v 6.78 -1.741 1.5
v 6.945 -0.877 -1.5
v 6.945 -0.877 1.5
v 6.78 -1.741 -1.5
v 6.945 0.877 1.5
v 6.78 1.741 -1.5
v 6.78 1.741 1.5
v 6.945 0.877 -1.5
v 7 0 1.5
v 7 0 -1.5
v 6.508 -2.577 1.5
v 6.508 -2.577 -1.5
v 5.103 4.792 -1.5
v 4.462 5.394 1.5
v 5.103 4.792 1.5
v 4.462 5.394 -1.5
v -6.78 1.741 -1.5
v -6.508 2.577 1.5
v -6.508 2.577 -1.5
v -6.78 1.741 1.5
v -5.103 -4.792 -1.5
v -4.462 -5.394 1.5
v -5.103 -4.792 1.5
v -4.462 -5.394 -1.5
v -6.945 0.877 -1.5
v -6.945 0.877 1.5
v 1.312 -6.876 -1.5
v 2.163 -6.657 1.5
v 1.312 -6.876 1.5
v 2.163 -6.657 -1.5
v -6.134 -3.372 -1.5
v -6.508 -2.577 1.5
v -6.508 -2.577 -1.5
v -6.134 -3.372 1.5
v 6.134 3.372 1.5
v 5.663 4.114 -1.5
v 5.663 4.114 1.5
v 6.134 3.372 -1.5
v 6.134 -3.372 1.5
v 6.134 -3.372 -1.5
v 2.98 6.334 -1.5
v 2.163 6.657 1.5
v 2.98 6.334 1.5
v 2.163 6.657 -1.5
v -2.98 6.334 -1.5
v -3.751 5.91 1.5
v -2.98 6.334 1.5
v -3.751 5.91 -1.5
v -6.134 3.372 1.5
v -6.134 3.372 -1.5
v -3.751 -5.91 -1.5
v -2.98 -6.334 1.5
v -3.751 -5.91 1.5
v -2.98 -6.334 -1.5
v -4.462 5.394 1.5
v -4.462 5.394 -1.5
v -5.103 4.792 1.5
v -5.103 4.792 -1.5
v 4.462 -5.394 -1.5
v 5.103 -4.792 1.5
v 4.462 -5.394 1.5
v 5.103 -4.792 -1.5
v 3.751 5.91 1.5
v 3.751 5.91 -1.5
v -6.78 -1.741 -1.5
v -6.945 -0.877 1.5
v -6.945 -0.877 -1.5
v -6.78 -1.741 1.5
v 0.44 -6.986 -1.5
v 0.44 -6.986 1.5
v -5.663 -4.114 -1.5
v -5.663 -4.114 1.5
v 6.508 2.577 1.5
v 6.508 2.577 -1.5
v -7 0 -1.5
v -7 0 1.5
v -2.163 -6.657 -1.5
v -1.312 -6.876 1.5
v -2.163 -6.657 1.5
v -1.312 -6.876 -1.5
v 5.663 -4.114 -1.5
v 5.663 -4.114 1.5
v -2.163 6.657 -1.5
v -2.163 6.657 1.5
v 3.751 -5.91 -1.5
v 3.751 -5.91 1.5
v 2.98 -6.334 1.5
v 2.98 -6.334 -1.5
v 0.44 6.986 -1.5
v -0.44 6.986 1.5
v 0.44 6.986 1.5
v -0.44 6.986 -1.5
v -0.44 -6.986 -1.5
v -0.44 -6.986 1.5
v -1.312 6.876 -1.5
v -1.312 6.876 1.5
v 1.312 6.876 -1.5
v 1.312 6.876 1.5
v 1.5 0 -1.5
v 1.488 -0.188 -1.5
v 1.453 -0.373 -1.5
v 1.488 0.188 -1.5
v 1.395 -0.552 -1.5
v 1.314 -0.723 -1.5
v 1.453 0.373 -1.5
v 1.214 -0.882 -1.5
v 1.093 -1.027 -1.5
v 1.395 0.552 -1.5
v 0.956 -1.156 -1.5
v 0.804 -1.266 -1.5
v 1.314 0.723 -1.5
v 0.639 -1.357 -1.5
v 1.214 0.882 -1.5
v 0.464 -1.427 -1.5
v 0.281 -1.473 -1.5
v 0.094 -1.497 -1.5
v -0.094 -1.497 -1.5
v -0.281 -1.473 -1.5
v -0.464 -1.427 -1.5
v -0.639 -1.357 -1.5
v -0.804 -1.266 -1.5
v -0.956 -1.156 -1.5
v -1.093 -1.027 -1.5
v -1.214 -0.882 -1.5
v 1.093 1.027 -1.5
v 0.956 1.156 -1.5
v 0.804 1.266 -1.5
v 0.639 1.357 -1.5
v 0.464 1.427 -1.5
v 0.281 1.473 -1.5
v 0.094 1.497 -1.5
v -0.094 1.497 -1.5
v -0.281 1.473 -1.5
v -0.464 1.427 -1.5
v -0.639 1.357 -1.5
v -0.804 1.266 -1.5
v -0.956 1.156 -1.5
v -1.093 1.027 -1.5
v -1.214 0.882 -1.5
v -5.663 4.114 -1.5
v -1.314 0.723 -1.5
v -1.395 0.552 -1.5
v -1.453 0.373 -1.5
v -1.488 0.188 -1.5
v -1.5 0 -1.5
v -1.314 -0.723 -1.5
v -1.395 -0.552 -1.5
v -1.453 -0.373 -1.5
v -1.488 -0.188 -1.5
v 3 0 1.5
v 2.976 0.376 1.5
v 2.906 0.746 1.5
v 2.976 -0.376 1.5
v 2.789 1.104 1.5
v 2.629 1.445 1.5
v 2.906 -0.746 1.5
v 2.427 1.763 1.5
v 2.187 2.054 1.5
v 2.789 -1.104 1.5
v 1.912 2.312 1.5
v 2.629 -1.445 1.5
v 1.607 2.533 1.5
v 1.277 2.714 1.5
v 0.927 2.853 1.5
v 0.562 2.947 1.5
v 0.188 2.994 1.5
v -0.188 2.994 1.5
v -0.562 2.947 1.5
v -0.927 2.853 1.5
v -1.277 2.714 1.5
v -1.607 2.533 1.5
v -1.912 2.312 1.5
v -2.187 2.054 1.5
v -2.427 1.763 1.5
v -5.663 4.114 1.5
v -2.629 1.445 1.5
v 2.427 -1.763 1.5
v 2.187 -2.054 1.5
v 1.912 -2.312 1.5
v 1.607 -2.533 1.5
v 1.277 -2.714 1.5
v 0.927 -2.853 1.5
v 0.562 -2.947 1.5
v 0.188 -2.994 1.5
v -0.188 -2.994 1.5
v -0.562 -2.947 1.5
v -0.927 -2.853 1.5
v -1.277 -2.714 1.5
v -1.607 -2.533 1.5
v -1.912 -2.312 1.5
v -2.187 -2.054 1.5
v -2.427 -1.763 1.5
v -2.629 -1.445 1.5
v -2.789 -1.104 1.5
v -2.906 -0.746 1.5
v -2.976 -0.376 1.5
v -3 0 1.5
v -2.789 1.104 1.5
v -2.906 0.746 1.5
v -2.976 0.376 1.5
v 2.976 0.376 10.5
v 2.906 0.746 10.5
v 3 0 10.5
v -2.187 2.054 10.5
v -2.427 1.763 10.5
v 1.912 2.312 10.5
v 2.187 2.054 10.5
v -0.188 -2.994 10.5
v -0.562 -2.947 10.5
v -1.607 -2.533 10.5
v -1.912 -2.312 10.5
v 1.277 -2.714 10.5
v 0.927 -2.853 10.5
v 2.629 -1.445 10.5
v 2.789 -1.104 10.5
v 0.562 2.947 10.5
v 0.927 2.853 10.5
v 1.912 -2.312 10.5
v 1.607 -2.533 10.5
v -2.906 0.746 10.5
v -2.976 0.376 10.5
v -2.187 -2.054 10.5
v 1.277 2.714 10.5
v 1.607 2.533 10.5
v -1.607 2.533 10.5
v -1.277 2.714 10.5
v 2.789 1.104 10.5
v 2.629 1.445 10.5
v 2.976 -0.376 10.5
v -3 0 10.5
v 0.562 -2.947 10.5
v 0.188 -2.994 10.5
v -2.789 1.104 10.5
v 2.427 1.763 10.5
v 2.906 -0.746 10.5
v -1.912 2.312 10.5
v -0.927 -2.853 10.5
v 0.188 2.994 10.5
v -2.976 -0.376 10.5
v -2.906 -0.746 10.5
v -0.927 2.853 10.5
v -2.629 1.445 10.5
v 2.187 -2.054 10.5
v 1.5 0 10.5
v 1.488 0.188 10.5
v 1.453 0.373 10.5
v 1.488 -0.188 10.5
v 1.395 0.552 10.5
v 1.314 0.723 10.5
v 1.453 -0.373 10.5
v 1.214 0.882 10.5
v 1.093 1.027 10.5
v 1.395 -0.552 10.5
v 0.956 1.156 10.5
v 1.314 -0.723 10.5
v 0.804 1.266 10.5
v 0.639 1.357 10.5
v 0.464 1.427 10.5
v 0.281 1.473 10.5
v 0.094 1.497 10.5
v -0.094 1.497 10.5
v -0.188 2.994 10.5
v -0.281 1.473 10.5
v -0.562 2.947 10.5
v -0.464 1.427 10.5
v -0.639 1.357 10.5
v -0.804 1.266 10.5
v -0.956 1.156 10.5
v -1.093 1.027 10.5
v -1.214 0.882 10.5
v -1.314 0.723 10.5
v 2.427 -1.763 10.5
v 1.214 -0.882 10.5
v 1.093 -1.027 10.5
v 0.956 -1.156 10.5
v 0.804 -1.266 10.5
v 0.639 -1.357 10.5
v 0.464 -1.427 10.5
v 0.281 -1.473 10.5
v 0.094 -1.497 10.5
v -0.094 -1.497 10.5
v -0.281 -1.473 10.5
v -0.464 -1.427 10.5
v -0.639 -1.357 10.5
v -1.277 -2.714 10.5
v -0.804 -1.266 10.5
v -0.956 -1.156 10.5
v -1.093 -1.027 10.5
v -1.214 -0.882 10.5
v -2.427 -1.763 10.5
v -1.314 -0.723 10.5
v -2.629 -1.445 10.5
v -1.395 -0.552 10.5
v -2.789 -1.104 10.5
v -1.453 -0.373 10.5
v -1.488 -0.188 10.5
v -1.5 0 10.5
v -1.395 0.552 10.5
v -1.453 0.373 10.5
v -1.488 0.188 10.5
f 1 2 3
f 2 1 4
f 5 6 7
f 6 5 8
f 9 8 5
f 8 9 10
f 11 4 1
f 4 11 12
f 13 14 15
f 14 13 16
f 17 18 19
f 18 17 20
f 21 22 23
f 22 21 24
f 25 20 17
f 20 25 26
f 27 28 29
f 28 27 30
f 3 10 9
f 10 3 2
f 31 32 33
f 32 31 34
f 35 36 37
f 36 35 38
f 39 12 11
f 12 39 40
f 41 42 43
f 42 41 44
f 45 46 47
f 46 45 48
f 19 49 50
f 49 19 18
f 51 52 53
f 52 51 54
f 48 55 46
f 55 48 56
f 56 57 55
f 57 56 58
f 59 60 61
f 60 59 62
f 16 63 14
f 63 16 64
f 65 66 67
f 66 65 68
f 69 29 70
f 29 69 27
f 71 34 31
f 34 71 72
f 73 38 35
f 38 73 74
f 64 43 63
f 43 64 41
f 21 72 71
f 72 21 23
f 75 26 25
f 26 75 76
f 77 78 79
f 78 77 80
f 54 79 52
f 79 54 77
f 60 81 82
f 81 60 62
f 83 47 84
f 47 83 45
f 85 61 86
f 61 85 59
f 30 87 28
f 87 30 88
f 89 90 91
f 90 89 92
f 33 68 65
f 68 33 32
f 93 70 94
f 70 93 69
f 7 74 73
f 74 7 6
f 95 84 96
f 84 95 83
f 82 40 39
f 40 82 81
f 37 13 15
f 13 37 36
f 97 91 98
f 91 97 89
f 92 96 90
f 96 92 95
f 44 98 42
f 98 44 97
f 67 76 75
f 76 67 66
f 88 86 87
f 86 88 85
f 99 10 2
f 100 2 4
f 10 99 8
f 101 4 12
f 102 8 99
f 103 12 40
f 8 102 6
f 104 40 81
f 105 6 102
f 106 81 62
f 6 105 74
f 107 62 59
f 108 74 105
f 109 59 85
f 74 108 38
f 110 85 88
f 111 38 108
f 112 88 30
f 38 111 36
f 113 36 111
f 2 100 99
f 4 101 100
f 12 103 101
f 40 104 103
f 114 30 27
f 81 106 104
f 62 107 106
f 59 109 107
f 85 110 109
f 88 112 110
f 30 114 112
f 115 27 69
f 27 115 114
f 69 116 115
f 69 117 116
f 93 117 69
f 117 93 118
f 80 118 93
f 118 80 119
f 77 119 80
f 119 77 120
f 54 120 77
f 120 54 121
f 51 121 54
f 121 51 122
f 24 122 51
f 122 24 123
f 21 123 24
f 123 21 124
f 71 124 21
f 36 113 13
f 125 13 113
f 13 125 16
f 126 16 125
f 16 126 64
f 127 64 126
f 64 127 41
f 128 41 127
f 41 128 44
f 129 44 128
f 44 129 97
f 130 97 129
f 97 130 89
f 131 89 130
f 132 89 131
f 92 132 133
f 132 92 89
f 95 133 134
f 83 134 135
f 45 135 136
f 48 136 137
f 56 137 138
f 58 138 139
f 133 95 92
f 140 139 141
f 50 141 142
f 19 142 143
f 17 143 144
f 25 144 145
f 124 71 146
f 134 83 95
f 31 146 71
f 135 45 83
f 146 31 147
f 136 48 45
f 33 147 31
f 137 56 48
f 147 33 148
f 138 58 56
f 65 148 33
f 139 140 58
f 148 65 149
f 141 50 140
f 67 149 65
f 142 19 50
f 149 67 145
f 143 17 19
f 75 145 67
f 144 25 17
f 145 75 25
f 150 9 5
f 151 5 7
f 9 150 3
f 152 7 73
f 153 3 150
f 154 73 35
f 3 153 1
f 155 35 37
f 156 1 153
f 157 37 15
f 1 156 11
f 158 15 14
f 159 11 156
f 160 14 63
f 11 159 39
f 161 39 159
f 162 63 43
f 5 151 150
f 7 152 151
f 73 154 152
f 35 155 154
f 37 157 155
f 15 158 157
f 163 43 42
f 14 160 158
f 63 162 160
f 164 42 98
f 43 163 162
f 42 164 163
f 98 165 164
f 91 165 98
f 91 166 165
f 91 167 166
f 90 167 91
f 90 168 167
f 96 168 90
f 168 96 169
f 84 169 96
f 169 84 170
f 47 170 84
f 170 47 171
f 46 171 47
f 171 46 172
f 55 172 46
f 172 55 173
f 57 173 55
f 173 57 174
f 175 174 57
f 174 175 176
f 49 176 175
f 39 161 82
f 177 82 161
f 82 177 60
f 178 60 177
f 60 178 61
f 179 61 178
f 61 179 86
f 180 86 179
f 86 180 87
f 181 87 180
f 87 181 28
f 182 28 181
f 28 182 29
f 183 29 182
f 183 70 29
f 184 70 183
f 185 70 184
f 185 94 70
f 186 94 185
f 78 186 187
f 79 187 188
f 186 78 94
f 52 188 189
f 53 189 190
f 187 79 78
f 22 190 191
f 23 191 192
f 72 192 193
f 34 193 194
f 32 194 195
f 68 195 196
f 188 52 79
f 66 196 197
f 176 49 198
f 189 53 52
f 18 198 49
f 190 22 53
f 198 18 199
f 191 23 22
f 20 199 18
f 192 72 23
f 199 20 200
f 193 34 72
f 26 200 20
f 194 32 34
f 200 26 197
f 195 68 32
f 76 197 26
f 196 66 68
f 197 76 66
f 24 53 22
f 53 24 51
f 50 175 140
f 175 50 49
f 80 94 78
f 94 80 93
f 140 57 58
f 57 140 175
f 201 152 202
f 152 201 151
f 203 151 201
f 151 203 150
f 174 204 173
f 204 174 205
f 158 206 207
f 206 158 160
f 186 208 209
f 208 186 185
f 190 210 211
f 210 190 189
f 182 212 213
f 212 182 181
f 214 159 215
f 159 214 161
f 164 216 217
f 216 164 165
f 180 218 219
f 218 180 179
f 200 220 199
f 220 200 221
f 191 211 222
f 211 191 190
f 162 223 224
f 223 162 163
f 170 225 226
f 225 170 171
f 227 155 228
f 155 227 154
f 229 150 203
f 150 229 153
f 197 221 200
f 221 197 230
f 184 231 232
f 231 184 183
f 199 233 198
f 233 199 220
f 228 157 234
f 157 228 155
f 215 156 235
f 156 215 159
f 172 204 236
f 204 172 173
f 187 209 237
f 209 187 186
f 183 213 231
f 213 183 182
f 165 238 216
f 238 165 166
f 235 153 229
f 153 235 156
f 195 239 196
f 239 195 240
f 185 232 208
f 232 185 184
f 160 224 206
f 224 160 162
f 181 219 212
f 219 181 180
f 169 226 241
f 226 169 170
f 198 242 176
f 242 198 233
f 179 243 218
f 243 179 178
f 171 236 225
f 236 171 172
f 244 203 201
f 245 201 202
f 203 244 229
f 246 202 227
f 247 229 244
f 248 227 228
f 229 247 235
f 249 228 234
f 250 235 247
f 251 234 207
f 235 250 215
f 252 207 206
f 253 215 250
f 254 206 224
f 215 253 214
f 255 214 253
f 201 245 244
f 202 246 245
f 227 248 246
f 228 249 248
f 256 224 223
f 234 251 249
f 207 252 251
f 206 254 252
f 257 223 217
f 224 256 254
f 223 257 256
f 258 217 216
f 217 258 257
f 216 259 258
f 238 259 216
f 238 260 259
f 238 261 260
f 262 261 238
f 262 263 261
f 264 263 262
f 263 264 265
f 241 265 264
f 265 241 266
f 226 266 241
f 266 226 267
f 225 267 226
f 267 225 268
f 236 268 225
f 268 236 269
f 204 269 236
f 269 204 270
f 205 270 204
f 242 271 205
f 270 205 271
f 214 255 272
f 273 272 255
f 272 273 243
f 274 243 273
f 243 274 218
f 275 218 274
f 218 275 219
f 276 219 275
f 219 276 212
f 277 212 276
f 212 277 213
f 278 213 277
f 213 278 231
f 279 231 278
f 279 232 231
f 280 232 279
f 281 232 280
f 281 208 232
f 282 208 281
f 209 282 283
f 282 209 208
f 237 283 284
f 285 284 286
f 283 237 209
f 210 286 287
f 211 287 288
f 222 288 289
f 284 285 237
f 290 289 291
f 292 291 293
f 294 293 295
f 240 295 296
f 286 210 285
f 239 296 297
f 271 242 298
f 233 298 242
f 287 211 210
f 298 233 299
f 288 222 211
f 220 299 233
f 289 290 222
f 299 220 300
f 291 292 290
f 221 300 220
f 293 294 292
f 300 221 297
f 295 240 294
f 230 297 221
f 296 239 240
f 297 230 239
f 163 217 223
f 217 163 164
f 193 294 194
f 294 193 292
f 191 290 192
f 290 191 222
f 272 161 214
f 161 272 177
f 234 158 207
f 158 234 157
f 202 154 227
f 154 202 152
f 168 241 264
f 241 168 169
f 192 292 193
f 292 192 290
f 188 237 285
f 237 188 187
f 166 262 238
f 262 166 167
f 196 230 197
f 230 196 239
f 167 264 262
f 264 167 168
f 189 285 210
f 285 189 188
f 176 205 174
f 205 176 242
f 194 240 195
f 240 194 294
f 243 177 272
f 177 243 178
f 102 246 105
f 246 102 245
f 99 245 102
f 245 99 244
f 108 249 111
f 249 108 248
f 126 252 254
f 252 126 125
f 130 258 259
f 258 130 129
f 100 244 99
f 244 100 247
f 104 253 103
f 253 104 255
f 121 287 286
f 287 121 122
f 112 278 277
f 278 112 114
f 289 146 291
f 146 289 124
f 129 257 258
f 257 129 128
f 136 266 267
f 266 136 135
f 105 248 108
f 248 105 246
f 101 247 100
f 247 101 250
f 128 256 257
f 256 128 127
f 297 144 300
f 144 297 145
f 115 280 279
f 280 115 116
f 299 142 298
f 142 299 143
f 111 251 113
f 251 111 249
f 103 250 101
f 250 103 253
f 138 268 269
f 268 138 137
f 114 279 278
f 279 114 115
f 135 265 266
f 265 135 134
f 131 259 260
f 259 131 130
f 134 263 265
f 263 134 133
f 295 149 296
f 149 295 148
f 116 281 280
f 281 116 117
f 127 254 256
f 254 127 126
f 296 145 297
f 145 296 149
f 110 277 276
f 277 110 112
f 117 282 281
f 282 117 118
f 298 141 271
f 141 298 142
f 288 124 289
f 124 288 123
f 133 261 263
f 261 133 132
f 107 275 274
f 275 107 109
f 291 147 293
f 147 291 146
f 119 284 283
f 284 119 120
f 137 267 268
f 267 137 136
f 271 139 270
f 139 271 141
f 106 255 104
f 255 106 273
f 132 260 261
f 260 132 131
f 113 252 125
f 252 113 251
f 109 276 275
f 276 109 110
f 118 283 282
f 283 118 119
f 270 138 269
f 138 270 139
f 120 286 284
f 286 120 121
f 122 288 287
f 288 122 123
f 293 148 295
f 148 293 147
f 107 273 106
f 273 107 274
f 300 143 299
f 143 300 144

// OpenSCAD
$fn = 50;


difference() {
	union() {
		translate(v = [0, 0, -1.5000000000]) {
			cylinder(h = 3, r = 7.0000000000);
		}
		translate(v = [0, 0, -1.5000000000]) {
			cylinder(h = 12, r = 3.0000000000);
		}
	}
	union() {
		translate(v = [0, 0, -100.0000000000]) {
			cylinder(h = 200, r = 1.5000000000);
		}
	}
}
